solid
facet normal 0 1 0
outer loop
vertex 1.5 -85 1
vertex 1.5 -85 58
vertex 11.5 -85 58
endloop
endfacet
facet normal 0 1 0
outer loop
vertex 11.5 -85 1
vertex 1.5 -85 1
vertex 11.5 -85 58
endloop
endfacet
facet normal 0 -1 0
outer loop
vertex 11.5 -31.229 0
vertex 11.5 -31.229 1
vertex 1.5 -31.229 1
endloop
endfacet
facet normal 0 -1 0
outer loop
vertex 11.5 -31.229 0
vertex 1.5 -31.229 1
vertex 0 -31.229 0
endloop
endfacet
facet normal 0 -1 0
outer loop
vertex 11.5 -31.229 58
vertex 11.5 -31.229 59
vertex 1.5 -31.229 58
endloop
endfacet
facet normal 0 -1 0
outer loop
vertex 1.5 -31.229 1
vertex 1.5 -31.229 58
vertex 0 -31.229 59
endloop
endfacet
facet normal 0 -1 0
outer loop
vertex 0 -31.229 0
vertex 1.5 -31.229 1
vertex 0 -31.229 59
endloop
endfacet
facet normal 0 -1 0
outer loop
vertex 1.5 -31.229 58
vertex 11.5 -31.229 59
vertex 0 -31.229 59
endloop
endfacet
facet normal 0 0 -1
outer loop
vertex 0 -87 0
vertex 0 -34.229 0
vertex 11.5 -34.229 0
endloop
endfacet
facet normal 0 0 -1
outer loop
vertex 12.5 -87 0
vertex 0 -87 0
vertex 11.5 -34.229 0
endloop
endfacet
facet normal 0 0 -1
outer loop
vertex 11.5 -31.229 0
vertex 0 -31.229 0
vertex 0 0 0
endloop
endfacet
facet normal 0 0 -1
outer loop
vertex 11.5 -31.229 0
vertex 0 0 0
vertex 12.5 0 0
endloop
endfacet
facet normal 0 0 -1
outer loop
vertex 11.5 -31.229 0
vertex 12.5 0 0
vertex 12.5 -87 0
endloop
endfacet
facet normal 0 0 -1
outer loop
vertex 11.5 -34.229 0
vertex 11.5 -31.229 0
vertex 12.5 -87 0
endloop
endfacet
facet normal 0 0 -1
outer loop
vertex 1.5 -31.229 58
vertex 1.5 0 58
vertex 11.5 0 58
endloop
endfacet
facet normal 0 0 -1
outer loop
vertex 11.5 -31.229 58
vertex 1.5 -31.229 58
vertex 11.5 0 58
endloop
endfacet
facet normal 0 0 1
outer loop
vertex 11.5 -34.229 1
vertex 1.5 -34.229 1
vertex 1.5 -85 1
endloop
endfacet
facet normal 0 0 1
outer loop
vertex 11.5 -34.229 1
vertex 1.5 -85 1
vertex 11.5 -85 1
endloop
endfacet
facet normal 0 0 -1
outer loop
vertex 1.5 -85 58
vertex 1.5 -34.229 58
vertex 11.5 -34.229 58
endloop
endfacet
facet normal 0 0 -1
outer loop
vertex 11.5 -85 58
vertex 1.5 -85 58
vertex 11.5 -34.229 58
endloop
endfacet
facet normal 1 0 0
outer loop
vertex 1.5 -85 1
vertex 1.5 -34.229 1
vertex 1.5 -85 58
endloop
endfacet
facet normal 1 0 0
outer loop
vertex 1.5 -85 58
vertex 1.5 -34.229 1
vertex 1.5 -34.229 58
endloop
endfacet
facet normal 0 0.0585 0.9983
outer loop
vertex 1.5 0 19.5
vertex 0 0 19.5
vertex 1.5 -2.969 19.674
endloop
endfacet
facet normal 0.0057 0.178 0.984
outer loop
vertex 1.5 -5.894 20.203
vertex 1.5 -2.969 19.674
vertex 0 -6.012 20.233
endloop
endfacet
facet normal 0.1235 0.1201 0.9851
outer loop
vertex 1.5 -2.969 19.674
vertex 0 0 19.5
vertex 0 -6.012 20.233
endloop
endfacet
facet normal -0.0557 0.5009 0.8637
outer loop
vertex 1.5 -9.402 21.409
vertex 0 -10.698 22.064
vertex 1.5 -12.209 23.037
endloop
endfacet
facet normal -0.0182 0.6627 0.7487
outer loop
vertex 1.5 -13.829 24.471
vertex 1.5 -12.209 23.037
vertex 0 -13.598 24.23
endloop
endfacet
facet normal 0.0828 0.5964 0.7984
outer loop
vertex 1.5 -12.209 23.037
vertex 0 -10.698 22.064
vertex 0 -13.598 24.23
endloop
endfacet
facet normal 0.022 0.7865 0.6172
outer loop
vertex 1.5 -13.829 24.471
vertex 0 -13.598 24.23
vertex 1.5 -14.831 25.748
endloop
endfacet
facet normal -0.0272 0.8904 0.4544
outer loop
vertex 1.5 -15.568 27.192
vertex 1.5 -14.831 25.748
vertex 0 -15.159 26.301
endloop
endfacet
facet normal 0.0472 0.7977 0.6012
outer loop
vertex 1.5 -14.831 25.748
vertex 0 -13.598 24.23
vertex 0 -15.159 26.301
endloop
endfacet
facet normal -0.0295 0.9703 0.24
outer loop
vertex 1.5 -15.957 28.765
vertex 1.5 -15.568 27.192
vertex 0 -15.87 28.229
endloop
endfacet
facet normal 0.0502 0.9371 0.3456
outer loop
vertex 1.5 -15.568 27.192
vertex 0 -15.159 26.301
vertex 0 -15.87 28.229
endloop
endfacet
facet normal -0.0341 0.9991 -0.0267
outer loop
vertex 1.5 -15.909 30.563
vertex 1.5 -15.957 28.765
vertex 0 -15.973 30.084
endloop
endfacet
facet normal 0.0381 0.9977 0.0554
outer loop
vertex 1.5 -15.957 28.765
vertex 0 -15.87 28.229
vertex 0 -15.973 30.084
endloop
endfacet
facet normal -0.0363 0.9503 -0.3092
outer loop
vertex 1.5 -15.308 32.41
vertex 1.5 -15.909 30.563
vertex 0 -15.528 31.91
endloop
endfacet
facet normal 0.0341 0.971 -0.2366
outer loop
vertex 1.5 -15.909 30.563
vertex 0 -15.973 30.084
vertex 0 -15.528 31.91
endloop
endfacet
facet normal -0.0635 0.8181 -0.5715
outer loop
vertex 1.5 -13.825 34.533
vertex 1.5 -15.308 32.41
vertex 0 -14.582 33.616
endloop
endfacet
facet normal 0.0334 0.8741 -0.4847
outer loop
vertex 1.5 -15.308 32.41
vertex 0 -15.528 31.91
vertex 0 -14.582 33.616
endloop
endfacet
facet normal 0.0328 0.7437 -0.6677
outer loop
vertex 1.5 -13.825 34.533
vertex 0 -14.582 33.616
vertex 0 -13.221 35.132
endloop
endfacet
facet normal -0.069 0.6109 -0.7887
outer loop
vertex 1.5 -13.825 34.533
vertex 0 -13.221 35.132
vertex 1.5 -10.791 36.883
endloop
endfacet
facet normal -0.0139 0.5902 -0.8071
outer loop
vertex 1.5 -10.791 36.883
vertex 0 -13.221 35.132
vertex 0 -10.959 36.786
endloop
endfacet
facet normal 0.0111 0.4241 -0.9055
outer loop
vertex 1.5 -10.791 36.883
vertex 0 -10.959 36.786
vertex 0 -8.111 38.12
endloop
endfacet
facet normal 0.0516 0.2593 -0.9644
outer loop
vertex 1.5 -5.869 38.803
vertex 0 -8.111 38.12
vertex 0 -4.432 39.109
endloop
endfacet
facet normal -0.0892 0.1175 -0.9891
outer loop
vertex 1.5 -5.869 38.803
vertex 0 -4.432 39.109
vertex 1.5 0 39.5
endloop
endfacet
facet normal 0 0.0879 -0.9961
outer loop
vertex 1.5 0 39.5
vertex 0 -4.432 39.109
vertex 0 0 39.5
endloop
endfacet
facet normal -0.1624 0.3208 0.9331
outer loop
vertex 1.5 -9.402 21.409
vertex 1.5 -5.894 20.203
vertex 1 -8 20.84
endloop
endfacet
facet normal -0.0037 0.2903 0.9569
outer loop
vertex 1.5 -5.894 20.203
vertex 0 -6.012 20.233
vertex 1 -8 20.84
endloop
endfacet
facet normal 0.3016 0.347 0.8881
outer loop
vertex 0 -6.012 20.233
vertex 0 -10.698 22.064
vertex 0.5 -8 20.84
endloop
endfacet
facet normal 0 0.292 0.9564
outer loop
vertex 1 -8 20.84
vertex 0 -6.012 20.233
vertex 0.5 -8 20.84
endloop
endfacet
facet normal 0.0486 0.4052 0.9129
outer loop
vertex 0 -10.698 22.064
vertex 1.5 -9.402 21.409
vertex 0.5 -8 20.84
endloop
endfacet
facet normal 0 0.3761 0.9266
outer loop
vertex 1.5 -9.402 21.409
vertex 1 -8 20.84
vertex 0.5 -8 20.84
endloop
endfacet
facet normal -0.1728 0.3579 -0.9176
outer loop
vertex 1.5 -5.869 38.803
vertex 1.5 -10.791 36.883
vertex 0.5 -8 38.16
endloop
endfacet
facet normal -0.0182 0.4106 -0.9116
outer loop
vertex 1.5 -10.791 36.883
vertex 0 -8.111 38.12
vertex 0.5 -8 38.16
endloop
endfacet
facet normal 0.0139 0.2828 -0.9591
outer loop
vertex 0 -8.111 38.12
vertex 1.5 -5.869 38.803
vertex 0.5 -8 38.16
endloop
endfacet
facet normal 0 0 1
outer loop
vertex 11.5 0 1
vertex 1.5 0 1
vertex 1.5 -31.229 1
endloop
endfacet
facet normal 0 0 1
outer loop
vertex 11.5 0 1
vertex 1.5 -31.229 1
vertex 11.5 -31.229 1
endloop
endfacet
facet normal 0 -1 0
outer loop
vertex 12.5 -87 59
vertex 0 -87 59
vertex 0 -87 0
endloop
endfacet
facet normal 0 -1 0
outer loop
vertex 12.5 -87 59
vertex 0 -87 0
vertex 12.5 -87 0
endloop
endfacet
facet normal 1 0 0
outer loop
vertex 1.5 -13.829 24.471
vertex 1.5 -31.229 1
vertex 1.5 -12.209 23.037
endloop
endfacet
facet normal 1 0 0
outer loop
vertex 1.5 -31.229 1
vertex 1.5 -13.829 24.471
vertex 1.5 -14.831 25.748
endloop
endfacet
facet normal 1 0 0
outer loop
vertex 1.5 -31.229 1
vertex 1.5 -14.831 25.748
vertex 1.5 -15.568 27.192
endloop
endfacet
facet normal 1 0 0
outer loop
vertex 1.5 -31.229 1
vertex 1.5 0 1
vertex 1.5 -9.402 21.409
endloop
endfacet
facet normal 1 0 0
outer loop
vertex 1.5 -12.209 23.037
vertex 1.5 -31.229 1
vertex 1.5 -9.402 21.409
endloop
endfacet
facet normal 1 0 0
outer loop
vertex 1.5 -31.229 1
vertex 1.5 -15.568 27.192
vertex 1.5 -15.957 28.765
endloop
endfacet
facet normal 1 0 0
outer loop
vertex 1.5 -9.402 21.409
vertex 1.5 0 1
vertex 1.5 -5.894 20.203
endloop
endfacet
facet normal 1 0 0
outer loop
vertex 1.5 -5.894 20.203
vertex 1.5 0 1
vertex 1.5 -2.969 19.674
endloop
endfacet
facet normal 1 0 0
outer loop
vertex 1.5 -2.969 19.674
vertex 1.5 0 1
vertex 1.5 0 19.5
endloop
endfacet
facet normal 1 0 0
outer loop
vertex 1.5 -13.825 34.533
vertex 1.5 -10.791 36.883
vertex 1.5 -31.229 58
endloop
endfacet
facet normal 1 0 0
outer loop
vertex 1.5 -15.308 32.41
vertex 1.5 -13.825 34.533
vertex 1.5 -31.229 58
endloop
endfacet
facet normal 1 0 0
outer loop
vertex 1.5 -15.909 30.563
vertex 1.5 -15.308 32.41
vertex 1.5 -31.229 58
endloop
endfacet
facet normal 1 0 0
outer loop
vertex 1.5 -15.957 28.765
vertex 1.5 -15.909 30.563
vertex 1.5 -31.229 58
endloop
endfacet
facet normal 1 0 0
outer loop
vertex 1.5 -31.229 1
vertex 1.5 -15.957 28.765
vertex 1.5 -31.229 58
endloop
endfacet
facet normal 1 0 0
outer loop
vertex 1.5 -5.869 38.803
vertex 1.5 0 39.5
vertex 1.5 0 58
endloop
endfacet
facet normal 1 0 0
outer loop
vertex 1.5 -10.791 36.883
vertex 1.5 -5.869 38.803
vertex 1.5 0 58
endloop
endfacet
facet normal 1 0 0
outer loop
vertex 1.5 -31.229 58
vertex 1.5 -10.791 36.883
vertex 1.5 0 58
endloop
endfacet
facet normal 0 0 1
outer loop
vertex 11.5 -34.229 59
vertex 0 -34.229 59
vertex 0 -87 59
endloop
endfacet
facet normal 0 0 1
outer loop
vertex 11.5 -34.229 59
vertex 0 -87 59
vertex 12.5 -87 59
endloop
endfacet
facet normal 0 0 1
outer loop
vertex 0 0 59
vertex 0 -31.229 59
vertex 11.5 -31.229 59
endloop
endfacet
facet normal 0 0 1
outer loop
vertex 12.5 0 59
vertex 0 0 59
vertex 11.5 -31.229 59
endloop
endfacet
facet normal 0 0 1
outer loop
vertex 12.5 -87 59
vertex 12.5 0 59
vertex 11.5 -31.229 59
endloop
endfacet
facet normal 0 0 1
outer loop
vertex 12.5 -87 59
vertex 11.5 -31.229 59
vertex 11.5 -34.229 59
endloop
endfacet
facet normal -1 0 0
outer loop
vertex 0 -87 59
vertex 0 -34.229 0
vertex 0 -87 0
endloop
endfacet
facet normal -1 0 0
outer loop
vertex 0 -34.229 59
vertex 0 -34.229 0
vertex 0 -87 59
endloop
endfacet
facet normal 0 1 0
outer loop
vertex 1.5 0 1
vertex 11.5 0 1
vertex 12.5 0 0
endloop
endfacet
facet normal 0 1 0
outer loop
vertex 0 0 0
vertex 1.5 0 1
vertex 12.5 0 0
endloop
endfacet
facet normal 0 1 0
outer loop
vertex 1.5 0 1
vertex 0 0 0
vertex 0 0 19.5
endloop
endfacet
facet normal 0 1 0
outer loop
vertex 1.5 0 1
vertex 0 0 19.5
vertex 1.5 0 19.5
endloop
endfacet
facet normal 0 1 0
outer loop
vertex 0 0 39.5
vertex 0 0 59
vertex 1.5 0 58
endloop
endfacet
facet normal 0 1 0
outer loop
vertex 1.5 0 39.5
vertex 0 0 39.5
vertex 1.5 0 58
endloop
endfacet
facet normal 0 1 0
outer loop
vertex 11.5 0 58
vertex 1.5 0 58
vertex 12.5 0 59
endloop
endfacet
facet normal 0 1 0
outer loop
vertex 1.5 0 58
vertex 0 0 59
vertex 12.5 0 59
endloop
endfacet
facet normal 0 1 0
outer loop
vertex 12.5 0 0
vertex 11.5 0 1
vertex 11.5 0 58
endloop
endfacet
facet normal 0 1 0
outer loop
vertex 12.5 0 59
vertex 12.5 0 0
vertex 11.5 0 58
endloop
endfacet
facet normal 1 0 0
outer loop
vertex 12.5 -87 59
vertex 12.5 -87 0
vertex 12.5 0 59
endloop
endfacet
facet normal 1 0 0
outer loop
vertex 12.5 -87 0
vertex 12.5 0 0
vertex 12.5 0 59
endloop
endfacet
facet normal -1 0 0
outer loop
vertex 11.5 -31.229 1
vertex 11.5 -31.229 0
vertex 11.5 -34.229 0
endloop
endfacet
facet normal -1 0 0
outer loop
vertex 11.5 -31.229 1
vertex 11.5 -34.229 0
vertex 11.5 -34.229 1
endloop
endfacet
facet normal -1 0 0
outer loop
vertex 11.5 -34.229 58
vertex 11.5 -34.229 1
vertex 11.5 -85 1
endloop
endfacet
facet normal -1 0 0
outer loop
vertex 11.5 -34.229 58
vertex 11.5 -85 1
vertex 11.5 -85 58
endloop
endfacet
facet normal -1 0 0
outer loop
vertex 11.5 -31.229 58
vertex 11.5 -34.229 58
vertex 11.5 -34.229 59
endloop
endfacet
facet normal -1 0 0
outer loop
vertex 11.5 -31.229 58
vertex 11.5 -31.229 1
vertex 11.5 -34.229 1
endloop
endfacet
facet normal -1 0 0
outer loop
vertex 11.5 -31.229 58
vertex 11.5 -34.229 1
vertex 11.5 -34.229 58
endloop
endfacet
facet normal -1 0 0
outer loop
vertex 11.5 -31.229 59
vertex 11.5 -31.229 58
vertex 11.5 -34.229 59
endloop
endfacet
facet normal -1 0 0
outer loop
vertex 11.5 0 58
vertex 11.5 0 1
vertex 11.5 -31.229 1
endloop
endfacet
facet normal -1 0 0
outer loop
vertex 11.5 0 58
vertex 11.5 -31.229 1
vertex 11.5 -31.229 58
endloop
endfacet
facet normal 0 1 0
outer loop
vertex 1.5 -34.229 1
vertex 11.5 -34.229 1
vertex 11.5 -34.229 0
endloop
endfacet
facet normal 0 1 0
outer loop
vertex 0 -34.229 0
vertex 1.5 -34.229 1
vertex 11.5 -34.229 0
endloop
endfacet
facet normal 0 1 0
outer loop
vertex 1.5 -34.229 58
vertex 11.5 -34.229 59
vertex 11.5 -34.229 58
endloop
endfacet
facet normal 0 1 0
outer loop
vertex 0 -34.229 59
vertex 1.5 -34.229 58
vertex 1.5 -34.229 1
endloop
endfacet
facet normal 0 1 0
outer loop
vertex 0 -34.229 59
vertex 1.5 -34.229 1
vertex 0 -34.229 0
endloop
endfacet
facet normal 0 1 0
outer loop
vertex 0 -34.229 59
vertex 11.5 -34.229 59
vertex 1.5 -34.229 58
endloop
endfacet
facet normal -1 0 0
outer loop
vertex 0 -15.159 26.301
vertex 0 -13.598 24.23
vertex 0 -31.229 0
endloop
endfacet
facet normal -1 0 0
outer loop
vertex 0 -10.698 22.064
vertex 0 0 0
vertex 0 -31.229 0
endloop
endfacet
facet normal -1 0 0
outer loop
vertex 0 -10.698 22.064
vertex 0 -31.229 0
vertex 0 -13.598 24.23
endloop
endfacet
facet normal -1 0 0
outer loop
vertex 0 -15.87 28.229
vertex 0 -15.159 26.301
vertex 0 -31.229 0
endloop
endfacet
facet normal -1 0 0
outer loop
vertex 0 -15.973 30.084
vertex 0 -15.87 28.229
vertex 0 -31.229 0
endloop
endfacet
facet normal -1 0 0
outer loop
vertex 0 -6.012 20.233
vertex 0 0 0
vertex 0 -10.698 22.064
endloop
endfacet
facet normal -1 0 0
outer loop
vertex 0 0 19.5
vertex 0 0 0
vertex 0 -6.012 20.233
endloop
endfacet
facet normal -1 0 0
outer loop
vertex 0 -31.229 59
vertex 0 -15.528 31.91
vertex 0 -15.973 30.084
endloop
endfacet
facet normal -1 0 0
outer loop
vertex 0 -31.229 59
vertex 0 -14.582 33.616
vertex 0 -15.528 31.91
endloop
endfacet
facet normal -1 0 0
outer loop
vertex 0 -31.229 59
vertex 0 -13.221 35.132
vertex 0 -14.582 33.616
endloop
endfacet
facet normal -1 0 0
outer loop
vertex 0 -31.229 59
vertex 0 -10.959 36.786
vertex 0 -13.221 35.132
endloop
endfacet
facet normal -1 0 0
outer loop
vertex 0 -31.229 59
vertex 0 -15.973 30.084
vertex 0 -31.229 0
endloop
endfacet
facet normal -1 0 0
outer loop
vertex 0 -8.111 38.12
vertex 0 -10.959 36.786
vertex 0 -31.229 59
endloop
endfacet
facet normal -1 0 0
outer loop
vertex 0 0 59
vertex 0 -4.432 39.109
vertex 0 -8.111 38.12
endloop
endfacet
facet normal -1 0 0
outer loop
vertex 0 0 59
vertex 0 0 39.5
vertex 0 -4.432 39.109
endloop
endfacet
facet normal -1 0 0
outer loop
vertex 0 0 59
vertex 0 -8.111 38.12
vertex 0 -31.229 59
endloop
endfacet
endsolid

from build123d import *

# Parameters (mm, degrees)
SKETCH_W        = 12.5
SKETCH_H        = 59
SKETCH_W_2      = 10
SKETCH_H_2      = 57
PAD_DEPTH       = 85
SKETCH001_W     = 12.5
SKETCH001_H     = 59
PAD001_DEPTH    = 2
POCKET_DEPTH    = 5
SKETCH003_W     = 20.915616
SKETCH003_H     = 3
POCKET001_DEPTH = 59.001


with BuildPart() as part:
    # Sketch → Pad (new body)
    with BuildSketch(Plane.XZ):
        with Locations((6.25, 29.5)):
            Rectangle(SKETCH_W, SKETCH_H)
        with Locations((6.5, 29.5)):
            Rectangle(SKETCH_W_2, SKETCH_H_2, mode=Mode.SUBTRACT)
    extrude(amount=PAD_DEPTH)

    # Sketch001 → Pad001 (new body)
    with BuildSketch(Plane.XZ.offset(85)):
        with Locations((6.25, 29.5)):
            Rectangle(SKETCH001_W, SKETCH001_H)
    extrude(amount=PAD001_DEPTH)

    # Sketch002 → Pocket (cut)
    with BuildSketch(Plane(origin=(0, 0, 0), x_dir=(0, 0, -1), z_dir=(-1, 0, 0))):
        with BuildLine():
            add(Edge.make_bspline(
                [(-29.5, -16), (-12.179492, -16), (-20.839746, 8), (-29.5, 32), (-38.160254, 8), (-46.820508, -16), (-29.5, -16)],
                knots=[0, 0, 0, 2.094395, 2.094395, 4.18879, 4.18879, 6.283185, 6.283185, 6.283185], degree=2, weights=[1, 0.5, 1, 0.5, 1, 0.5, 1]))
        make_face()
    extrude(amount=-POCKET_DEPTH, mode=Mode.SUBTRACT)

    # Sketch003 → Pocket001 (cut, through all)
    with BuildSketch(Plane(origin=(0, 0, 59), x_dir=(-1, 0, 0), z_dir=(0, 0, 1))):
        with Locations((-1.042192, 32.729344)):
            Rectangle(SKETCH003_W, SKETCH003_H)
    extrude(amount=-POCKET001_DEPTH, mode=Mode.SUBTRACT)


solid = part.part
